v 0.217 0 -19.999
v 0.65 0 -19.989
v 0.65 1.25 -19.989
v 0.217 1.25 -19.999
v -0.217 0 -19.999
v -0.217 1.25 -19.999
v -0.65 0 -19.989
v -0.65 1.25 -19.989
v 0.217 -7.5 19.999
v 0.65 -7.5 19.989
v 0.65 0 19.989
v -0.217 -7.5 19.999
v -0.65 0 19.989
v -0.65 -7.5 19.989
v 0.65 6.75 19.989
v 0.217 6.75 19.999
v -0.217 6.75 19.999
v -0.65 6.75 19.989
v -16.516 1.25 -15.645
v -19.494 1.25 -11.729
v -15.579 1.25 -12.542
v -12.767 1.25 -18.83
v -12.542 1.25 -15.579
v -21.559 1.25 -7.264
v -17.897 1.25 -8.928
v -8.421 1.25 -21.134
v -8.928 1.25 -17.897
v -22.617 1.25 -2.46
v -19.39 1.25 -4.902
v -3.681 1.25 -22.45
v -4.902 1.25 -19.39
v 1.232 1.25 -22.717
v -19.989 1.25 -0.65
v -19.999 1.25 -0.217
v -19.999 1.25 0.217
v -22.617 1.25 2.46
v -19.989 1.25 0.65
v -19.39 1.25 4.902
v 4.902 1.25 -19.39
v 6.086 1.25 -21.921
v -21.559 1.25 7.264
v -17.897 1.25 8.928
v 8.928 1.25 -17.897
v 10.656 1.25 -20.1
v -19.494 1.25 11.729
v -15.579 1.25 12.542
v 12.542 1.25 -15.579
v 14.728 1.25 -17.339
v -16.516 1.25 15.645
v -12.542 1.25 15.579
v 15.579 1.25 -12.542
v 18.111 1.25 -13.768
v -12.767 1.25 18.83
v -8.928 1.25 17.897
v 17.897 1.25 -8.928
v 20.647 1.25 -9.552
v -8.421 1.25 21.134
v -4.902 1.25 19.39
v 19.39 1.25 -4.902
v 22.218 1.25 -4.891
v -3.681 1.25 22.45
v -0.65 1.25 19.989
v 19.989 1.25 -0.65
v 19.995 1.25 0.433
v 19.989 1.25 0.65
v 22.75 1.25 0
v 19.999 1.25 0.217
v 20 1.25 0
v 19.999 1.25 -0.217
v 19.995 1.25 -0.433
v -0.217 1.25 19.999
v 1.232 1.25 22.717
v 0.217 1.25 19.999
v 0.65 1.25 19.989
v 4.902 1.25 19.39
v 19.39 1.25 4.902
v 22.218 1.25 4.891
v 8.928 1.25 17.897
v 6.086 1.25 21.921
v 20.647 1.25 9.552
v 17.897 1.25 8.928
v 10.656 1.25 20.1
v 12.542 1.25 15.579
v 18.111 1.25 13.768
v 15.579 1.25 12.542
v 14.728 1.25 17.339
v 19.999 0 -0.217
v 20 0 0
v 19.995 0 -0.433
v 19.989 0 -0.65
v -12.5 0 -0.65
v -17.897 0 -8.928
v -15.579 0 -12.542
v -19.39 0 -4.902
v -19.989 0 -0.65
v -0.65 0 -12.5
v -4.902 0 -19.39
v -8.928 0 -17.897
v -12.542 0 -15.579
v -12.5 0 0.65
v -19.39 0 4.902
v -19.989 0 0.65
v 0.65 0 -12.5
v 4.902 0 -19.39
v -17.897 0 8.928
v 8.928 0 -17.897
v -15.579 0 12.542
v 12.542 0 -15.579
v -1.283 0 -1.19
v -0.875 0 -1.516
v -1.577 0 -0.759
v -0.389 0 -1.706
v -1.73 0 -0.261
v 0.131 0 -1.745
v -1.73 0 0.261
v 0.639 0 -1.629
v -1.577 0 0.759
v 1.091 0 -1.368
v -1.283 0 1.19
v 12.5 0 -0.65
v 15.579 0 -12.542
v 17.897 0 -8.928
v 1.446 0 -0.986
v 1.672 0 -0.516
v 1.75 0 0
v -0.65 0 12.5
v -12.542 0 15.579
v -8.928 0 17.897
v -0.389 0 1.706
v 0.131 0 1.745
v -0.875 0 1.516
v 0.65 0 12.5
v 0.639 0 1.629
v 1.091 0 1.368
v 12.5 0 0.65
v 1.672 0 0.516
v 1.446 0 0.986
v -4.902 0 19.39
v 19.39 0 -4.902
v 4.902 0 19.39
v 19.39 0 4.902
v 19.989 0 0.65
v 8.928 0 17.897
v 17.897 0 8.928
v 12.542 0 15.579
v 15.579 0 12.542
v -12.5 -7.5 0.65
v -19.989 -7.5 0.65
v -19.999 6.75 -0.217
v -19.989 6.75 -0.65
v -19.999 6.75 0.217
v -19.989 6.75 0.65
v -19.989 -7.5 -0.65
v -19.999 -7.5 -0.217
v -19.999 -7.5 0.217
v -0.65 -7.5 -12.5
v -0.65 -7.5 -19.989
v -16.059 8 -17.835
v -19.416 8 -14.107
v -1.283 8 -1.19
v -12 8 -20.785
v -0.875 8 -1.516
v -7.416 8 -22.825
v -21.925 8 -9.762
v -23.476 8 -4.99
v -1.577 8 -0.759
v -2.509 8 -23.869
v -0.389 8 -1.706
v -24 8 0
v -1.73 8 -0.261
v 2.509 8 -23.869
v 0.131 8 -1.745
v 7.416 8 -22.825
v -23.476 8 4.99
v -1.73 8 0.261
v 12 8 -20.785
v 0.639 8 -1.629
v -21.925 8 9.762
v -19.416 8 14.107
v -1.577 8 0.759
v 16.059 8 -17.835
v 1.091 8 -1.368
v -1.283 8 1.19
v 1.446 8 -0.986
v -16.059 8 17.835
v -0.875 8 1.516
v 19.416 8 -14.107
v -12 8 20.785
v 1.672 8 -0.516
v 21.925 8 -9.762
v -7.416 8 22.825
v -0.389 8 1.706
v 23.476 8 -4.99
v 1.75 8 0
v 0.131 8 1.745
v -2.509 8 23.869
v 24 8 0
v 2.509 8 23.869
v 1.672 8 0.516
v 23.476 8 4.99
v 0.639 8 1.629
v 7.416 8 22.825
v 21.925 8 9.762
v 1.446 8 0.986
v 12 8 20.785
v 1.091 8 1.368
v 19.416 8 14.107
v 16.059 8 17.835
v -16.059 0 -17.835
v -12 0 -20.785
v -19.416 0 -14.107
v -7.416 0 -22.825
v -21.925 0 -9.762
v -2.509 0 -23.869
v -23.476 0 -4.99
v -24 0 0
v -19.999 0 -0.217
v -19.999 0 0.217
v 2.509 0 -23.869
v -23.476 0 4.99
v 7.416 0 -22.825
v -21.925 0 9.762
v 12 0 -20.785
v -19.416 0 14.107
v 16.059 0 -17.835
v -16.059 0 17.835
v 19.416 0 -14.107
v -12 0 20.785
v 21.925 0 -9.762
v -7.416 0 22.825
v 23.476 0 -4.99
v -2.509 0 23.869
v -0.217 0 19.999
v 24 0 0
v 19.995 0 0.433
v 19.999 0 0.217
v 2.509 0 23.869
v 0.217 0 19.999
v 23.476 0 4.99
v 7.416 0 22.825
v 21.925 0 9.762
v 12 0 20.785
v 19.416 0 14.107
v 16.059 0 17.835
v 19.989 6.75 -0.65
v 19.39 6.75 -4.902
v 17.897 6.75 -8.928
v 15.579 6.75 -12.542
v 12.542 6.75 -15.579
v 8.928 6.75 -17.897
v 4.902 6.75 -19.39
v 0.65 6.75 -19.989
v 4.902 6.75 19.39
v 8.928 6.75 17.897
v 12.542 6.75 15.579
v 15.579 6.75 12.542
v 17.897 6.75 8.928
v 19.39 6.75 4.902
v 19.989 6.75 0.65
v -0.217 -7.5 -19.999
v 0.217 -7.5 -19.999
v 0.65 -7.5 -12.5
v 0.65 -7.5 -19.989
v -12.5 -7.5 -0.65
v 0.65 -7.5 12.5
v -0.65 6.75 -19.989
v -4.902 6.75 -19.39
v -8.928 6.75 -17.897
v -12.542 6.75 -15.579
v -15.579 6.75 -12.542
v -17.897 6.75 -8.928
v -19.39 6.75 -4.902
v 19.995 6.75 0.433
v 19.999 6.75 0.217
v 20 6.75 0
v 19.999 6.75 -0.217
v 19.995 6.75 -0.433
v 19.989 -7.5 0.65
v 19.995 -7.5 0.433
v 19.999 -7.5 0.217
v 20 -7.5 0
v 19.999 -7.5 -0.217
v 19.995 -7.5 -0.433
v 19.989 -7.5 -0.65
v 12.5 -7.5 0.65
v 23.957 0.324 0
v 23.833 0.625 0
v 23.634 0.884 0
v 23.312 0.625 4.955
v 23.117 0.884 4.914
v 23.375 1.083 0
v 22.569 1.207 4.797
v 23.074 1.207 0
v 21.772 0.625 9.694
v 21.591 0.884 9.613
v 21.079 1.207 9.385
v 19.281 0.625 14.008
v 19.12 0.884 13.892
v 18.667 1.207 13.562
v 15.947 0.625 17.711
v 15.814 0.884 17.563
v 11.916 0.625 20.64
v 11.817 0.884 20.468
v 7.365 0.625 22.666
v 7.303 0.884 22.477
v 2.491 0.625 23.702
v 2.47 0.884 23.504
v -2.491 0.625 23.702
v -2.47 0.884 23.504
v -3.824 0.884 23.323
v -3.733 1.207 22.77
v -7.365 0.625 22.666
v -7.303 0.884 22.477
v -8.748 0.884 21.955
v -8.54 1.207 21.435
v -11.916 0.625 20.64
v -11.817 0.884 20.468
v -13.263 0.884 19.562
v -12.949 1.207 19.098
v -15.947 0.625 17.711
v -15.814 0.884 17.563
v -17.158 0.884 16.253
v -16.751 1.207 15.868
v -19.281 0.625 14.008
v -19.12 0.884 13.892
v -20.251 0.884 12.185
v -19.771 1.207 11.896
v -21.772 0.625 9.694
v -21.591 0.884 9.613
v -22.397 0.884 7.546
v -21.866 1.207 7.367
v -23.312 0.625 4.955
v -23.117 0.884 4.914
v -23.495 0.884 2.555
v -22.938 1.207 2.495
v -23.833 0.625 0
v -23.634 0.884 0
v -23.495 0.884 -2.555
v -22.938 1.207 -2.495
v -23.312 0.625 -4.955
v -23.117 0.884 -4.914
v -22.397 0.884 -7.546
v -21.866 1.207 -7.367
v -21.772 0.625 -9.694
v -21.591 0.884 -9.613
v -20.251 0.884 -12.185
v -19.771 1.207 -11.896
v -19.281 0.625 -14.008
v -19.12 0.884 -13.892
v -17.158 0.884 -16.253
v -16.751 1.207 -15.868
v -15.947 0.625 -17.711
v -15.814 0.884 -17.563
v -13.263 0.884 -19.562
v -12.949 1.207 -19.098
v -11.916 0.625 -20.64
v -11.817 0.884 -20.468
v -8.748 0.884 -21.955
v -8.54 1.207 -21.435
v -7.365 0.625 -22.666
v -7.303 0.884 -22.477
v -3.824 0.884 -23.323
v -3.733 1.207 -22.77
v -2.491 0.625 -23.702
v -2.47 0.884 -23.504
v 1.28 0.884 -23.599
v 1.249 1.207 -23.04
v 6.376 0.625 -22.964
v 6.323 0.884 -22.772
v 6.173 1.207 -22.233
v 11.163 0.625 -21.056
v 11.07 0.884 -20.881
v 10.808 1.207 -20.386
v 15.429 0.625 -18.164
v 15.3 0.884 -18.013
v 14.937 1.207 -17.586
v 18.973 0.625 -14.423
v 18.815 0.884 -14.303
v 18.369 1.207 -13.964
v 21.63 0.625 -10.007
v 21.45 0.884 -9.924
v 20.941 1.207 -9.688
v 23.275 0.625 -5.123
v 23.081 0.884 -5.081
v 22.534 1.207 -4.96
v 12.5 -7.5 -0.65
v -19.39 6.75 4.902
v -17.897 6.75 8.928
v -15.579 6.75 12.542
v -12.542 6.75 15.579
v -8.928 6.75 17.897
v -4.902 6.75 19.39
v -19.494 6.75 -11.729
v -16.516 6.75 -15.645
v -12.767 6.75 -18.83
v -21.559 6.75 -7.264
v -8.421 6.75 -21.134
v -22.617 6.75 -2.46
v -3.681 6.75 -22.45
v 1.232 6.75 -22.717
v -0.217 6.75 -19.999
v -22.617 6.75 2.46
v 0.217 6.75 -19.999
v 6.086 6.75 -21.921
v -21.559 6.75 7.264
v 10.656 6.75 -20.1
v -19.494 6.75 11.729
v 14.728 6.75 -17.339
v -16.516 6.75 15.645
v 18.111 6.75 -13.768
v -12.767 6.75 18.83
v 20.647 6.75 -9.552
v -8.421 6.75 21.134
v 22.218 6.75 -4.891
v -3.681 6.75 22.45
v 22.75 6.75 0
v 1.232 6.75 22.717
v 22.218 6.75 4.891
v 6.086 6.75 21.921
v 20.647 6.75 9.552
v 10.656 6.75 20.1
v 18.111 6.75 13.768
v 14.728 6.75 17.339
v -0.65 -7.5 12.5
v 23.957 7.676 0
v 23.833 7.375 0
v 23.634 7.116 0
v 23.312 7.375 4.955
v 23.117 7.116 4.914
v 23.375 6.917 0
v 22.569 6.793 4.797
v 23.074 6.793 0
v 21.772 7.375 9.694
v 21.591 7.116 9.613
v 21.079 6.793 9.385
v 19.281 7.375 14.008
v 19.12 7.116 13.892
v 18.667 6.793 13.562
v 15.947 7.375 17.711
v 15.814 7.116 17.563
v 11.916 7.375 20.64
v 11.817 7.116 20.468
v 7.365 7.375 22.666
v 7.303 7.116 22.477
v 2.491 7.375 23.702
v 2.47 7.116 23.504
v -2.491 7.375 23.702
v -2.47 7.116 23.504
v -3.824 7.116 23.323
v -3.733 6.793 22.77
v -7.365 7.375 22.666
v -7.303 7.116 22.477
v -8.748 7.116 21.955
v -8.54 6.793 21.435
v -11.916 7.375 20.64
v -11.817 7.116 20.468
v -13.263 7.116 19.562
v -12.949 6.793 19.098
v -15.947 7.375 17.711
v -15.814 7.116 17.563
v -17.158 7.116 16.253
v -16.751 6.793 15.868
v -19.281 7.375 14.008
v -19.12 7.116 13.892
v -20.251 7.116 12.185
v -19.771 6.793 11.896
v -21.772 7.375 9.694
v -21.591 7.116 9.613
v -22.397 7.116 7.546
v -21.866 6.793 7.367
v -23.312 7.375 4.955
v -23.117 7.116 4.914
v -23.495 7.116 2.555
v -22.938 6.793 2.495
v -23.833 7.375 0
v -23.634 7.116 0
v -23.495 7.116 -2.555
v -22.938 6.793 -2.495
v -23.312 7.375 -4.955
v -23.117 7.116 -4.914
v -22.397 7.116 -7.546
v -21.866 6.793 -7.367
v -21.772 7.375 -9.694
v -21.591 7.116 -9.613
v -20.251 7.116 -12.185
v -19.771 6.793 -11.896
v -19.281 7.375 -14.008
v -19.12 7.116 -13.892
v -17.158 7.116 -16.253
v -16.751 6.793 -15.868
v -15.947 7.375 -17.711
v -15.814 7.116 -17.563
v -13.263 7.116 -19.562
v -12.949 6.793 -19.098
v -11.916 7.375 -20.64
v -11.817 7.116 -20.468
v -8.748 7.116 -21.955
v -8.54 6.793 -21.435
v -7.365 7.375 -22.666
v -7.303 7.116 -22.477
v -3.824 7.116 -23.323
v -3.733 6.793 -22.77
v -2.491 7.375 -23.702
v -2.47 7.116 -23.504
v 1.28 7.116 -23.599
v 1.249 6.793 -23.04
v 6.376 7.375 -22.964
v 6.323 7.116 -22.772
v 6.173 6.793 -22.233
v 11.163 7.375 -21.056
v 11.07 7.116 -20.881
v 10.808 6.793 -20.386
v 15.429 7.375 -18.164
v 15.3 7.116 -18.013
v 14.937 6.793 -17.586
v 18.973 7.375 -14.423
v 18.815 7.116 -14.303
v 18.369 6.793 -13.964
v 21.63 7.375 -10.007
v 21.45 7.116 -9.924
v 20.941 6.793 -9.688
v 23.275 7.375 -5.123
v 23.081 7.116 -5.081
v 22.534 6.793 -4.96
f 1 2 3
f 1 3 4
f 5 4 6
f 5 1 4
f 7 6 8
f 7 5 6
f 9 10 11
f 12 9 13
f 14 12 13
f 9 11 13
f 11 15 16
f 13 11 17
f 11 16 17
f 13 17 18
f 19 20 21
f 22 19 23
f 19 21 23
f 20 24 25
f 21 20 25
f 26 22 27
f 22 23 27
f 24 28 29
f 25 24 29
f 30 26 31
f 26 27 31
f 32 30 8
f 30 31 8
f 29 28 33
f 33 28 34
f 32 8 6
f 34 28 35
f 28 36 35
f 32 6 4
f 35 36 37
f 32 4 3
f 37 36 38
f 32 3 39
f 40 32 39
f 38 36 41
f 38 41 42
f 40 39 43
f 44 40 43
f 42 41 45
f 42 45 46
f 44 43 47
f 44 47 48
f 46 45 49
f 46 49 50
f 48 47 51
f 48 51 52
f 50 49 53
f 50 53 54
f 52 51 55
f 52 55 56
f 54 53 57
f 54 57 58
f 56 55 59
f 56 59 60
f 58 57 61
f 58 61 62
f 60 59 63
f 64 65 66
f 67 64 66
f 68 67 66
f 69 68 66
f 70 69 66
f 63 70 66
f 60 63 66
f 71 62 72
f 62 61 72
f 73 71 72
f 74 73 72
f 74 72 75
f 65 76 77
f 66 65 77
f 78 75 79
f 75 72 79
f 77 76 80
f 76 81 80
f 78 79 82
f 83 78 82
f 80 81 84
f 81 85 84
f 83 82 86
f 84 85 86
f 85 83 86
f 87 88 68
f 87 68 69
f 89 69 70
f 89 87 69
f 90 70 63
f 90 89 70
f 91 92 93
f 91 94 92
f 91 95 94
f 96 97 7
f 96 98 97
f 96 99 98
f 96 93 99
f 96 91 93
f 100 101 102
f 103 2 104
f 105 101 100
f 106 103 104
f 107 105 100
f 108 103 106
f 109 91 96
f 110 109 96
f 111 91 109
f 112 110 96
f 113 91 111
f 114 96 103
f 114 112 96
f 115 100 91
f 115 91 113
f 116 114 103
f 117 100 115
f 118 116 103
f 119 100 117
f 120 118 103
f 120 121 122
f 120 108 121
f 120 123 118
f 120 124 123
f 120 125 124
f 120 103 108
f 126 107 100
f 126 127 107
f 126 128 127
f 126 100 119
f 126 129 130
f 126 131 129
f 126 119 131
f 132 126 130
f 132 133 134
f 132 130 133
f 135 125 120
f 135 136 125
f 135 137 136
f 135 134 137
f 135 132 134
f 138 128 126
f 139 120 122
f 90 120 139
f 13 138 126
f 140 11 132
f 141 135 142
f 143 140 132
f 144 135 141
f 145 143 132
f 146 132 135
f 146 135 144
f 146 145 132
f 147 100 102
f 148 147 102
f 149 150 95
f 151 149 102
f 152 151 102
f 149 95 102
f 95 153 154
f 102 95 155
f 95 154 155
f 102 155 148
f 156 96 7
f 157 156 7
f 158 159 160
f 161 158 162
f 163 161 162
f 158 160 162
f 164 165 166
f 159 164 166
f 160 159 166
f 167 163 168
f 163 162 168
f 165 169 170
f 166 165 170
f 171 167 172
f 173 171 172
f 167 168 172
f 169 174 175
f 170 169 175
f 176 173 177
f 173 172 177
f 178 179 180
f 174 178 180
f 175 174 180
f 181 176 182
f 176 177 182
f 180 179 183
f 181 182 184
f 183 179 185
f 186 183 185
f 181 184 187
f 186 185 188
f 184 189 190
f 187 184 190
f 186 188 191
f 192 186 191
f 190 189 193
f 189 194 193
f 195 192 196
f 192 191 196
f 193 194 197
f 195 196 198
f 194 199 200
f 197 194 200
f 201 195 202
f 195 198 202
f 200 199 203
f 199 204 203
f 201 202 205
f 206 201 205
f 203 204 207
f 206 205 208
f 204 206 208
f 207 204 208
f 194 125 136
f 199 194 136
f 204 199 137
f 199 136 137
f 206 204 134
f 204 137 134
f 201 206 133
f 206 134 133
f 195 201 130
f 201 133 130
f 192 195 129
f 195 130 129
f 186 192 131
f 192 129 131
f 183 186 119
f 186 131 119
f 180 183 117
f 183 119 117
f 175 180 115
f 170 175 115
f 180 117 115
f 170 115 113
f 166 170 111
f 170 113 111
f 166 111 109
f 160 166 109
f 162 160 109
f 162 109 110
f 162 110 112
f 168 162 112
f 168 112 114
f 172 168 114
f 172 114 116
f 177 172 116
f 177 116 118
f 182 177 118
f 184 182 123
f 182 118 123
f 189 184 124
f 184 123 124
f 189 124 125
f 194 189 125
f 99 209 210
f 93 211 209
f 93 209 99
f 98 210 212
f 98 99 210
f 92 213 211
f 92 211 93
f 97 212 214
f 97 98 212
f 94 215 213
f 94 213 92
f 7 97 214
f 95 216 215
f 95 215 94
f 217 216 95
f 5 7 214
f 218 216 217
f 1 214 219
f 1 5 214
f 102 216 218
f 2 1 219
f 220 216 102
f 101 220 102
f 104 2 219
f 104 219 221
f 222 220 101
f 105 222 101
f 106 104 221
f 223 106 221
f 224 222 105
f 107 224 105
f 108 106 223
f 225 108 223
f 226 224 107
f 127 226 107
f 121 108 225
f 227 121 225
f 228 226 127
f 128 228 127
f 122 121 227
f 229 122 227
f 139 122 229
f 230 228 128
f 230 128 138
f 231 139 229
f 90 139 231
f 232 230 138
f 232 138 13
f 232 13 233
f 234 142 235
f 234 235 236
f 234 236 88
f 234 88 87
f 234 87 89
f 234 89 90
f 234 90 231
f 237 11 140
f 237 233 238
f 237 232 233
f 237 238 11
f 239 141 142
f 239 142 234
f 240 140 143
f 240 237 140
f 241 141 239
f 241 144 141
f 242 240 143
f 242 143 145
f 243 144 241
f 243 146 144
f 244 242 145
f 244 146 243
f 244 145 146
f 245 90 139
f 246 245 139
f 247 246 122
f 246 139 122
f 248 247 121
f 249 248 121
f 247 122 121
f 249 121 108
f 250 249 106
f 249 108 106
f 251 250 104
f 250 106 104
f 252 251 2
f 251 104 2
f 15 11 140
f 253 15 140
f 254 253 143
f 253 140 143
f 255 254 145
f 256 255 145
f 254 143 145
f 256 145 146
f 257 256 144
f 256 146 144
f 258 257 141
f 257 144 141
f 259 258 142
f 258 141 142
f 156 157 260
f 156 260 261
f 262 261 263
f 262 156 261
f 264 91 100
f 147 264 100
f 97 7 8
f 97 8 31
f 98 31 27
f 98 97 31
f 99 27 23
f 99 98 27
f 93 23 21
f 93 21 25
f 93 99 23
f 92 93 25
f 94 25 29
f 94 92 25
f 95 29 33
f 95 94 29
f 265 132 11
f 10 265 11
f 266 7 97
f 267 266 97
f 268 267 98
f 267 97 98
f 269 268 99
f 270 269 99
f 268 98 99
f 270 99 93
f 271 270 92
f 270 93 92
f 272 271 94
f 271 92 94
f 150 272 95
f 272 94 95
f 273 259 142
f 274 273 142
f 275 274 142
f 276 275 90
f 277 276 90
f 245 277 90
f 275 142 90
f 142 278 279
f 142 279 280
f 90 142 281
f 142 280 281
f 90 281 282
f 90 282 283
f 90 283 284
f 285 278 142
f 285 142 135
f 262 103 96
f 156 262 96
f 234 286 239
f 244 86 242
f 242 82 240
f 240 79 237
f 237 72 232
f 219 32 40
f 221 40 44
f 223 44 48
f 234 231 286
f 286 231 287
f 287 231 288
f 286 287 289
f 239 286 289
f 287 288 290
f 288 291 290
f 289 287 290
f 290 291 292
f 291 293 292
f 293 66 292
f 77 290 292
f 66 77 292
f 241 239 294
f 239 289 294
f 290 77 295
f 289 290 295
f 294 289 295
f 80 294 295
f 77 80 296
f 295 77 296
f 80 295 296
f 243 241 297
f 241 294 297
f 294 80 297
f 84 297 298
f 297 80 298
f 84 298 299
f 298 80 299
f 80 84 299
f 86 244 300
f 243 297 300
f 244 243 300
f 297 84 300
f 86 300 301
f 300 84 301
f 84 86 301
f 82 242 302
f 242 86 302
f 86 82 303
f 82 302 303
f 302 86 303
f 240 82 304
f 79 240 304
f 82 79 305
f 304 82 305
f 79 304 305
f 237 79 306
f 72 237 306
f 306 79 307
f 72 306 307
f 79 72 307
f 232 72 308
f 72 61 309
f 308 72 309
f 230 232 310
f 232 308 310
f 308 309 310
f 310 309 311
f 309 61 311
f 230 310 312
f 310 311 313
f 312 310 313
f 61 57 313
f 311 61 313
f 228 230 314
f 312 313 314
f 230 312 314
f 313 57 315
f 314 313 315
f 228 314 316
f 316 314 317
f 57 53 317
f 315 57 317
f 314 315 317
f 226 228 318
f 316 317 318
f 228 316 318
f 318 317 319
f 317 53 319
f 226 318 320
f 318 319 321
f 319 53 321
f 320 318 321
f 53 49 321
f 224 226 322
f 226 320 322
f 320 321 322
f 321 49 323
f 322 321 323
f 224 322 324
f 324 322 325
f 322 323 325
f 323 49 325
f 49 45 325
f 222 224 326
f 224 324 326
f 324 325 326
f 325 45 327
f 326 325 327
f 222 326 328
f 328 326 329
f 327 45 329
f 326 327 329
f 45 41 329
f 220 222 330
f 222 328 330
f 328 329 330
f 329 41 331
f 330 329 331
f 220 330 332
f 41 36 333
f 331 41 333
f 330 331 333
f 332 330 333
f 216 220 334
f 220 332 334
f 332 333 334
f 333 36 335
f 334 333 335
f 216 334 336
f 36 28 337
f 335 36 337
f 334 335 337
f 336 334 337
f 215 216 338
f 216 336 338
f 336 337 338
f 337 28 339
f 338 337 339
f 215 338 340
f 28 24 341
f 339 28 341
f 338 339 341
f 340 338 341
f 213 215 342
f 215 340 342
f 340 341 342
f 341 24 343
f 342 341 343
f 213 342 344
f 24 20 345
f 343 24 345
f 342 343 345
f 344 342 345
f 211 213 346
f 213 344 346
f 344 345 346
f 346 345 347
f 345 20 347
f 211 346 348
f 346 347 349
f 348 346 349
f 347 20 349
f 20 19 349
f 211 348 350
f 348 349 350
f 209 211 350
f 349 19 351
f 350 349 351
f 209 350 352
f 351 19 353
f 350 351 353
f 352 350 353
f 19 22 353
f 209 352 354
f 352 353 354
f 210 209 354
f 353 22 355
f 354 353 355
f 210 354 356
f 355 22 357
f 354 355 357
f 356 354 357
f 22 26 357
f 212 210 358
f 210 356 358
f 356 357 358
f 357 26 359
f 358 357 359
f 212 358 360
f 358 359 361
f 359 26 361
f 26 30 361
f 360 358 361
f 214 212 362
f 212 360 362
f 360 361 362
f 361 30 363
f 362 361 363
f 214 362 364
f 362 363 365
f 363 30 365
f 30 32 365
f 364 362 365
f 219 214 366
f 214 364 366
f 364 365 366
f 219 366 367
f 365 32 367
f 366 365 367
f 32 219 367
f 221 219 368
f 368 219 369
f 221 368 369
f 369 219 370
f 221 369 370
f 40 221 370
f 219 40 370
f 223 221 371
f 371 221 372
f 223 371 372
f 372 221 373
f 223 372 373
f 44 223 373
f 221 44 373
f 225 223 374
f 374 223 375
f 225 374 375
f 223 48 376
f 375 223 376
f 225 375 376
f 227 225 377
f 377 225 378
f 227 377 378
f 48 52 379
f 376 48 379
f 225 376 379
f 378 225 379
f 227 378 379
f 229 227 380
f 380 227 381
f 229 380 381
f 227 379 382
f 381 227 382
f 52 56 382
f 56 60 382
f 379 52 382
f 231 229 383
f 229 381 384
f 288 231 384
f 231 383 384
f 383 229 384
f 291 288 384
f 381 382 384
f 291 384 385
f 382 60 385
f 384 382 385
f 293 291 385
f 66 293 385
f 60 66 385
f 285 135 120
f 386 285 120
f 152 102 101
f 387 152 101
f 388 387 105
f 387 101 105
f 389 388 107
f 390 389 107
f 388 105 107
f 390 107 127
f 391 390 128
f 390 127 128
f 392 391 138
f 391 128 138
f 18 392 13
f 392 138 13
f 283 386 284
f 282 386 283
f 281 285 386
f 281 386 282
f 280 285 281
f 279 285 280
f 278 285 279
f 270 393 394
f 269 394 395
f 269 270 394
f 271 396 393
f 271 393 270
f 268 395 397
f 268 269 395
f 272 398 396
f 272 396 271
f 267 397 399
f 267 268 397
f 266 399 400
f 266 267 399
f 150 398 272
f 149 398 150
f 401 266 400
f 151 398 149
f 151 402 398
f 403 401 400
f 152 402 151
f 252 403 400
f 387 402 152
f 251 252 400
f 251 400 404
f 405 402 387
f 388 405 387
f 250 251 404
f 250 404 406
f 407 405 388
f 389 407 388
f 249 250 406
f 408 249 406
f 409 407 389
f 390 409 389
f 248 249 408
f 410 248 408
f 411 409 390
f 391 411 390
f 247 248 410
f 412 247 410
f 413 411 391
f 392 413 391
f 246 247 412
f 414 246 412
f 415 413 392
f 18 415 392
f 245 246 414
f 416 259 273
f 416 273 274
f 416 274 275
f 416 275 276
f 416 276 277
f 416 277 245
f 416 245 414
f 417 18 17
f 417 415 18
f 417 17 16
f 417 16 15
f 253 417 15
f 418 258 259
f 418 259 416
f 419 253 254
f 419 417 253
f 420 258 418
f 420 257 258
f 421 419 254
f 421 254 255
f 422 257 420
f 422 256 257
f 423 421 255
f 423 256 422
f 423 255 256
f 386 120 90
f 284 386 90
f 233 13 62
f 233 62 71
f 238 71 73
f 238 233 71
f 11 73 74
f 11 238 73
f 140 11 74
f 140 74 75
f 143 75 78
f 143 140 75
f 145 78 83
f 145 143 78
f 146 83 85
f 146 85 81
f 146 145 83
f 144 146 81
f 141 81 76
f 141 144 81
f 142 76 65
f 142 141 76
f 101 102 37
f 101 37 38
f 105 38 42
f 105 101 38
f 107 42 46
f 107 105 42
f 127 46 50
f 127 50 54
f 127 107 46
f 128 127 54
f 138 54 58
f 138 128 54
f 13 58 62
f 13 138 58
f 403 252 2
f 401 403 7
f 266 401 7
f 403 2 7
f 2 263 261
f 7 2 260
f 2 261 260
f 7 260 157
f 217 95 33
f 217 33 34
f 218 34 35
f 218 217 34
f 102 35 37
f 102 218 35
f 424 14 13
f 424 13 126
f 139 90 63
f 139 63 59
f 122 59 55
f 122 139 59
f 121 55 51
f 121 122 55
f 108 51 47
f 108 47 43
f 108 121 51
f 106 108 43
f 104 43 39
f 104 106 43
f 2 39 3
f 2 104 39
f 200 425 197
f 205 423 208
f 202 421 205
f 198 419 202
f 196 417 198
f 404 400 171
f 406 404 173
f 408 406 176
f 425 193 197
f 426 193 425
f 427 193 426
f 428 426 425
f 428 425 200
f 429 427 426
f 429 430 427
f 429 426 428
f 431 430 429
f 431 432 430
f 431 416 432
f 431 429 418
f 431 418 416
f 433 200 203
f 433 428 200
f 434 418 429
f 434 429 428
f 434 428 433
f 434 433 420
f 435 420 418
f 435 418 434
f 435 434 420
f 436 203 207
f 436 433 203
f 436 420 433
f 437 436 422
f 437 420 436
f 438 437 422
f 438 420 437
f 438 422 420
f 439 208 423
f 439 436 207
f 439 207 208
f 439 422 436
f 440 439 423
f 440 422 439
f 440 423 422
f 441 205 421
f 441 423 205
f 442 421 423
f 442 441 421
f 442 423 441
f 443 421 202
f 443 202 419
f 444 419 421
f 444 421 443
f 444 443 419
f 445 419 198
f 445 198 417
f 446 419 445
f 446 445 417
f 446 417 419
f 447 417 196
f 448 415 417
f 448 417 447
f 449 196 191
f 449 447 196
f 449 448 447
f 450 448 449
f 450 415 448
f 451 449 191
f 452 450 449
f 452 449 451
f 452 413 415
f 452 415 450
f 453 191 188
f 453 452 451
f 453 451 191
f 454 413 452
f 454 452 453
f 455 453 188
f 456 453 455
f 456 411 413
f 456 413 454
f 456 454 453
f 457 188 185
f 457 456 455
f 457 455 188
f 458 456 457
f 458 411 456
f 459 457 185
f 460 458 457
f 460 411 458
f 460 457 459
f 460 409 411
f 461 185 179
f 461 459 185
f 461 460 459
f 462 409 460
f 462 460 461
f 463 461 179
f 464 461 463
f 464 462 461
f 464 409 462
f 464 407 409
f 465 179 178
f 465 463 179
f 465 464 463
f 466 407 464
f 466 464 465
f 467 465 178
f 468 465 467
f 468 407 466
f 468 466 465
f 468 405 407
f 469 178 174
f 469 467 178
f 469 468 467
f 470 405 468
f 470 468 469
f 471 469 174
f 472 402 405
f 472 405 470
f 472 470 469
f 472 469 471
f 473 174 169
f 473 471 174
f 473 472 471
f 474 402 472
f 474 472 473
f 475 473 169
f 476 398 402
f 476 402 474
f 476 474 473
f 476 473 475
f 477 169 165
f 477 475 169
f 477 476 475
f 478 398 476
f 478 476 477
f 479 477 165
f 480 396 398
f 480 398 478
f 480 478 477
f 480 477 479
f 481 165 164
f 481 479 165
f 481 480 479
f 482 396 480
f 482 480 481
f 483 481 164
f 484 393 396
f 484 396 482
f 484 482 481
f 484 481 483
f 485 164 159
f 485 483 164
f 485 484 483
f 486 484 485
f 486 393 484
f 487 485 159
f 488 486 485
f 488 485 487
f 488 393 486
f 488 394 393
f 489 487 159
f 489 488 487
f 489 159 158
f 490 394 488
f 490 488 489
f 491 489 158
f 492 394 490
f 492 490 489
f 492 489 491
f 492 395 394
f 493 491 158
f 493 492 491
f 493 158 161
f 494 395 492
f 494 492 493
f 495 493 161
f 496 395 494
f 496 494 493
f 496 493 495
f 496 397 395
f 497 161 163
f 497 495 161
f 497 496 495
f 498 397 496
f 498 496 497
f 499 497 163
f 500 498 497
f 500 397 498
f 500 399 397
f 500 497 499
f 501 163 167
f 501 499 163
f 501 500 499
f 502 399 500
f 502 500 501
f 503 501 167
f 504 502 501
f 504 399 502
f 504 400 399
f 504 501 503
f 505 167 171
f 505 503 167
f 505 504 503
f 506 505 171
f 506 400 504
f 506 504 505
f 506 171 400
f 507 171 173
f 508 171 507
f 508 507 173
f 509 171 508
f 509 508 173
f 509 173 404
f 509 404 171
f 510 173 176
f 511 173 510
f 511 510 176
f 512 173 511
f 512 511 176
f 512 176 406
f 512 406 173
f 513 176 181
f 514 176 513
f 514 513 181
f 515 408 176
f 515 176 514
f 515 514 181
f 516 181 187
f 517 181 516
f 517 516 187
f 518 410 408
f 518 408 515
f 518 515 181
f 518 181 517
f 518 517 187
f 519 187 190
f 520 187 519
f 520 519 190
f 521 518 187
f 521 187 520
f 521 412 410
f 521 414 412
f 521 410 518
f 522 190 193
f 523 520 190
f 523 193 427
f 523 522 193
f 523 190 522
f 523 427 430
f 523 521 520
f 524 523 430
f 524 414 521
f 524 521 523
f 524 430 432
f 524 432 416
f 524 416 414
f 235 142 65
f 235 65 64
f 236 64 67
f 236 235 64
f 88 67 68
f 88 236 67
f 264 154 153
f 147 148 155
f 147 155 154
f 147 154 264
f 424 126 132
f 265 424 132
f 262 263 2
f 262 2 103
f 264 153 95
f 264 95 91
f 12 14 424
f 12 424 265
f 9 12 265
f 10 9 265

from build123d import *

# Parameters (mm, degrees)
F0_R     = 24
F0_R_2   = 1.75
F1_DEPTH = 8
F2_DEPTH = 6.75
F3_DEPTH = 1.25
F4_R     = 1.24999
F4_2_R   = 1.24999
F5_DEPTH = 7.5


# Not quite as in the source:
# - a fillet or chamfer is up to 0.001 mm smaller than in the source, because OpenCascade refuses the exact size
# - after a boolean that leaves OpenCascade's solid faulty, fix() repairs it


with BuildPart() as f1:
    # F0 (on Front) → F1 (new body)
    with BuildSketch(Plane.XZ):
        Circle(F0_R)
        with BuildLine():
            ThreePointArc((19.9894375, 0.649914174), (19.9973592007, 0.325), (20, 0))
            ThreePointArc((20, 0), (19.9973592007, -0.325), (19.9894375, -0.649914174))
            ThreePointArc((19.9894375, -0.649914174), (14.1421356237, -14.1421356237), (0.649914174, -19.9894375))
            ThreePointArc((0.649914174, -19.9894375), (0, -20), (-0.649914174, -19.9894375))
            ThreePointArc((-0.649914174, -19.9894375), (-14.1421356237, -14.1421356237), (-19.9894375, -0.649914174))
            ThreePointArc((-19.9894375, -0.649914174), (-20, 0), (-19.9894375, 0.649914174))
            ThreePointArc((-19.9894375, 0.649914174), (-14.1421356237, 14.1421356237), (-0.649914174, 19.9894375))
            ThreePointArc((-0.649914174, 19.9894375), (0, 20), (0.649914174, 19.9894375))
            ThreePointArc((0.649914174, 19.9894375), (14.1421356237, 14.1421356237), (19.9894375, 0.649914174))
        make_face(mode=Mode.SUBTRACT)
        with BuildLine():
            Line((12.5, 0.649914174), (19.9894375, 0.649914174))
            ThreePointArc((19.9894375, 0.649914174), (14.1421356237, 14.1421356237), (0.649914174, 19.9894375))
            Line((0.649914174, 19.9894375), (0.649914174, 12.5))
            Line((0.649914174, 12.5), (-0.649914174, 12.5))
            Line((-0.649914174, 12.5), (-0.649914174, 19.9894375))
            ThreePointArc((-0.649914174, 19.9894375), (-14.1421356237, 14.1421356237), (-19.9894375, 0.649914174))
            Line((-19.9894375, 0.649914174), (-12.5, 0.649914174))
            Line((-12.5, 0.649914174), (-12.5, -0.649914174))
            Line((-12.5, -0.649914174), (-19.9894375, -0.649914174))
            ThreePointArc((-19.9894375, -0.649914174), (-14.1421356237, -14.1421356237), (-0.649914174, -19.9894375))
            Line((-0.649914174, -19.9894375), (-0.649914174, -12.5))
            Line((-0.649914174, -12.5), (0.649914174, -12.5))
            Line((0.649914174, -12.5), (0.649914174, -19.9894375))
            ThreePointArc((0.649914174, -19.9894375), (14.1421356237, -14.1421356237), (19.9894375, -0.649914174))
            Line((19.9894375, -0.649914174), (12.5, -0.649914174))
            Line((12.5, -0.649914174), (12.5, 0.649914174))
        make_face()
        Circle(F0_R_2, mode=Mode.SUBTRACT)
        with BuildLine():
            Line((0.649914174, 12.5), (0.649914174, 19.9894375))
            ThreePointArc((0.649914174, 19.9894375), (0, 20), (-0.649914174, 19.9894375))
            Line((-0.649914174, 19.9894375), (-0.649914174, 12.5))
            Line((-0.649914174, 12.5), (0.649914174, 12.5))
        make_face()
        with BuildLine():
            ThreePointArc((19.9894375, -0.649914174), (19.9973592007, -0.325), (20, 0))
            ThreePointArc((20, 0), (19.9973592007, 0.325), (19.9894375, 0.649914174))
            Line((19.9894375, 0.649914174), (12.5, 0.649914174))
            Line((12.5, 0.649914174), (12.5, -0.649914174))
            Line((12.5, -0.649914174), (19.9894375, -0.649914174))
        make_face()
        with BuildLine():
            Line((-12.5, 0.649914174), (-19.9894375, 0.649914174))
            ThreePointArc((-19.9894375, 0.649914174), (-20, 0), (-19.9894375, -0.649914174))
            Line((-19.9894375, -0.649914174), (-12.5, -0.649914174))
            Line((-12.5, -0.649914174), (-12.5, 0.649914174))
        make_face()
        with BuildLine():
            ThreePointArc((-0.649914174, -19.9894375), (0, -20), (0.649914174, -19.9894375))
            Line((0.649914174, -19.9894375), (0.649914174, -12.5))
            Line((0.649914174, -12.5), (-0.649914174, -12.5))
            Line((-0.649914174, -12.5), (-0.649914174, -19.9894375))
        make_face()
    extrude(amount=-F1_DEPTH)

    # F0 (on Front) → F2 (cut)
    with BuildSketch(Plane.XZ):
        Circle(F0_R)
        with BuildLine():
            ThreePointArc((19.9894375, 0.649914174), (19.9973592007, 0.325), (20, 0))
            ThreePointArc((20, 0), (19.9973592007, -0.325), (19.9894375, -0.649914174))
            ThreePointArc((19.9894375, -0.649914174), (14.1421356237, -14.1421356237), (0.649914174, -19.9894375))
            ThreePointArc((0.649914174, -19.9894375), (0, -20), (-0.649914174, -19.9894375))
            ThreePointArc((-0.649914174, -19.9894375), (-14.1421356237, -14.1421356237), (-19.9894375, -0.649914174))
            ThreePointArc((-19.9894375, -0.649914174), (-20, 0), (-19.9894375, 0.649914174))
            ThreePointArc((-19.9894375, 0.649914174), (-14.1421356237, 14.1421356237), (-0.649914174, 19.9894375))
            ThreePointArc((-0.649914174, 19.9894375), (0, 20), (0.649914174, 19.9894375))
            ThreePointArc((0.649914174, 19.9894375), (14.1421356237, 14.1421356237), (19.9894375, 0.649914174))
        make_face(mode=Mode.SUBTRACT)
    extrude(amount=-F2_DEPTH, mode=Mode.SUBTRACT)

    # F4 (radius 1.25 in the source; OpenCascade refuses exactly that, so slightly less here)
    f4_edges = [f1.edges().sort_by_distance(p)[0] for p in [
        (-24, 6.75, 0),
    ]]
    fillet(f4_edges, radius=F4_R)

    # F0 (on Front) → F5 (join)
    with BuildSketch(Plane.XZ):
        with BuildLine():
            Line((0.649914174, 12.5), (0.649914174, 19.9894375))
            ThreePointArc((0.649914174, 19.9894375), (0, 20), (-0.649914174, 19.9894375))
            Line((-0.649914174, 19.9894375), (-0.649914174, 12.5))
            Line((-0.649914174, 12.5), (0.649914174, 12.5))
        make_face()
        with BuildLine():
            Line((-12.5, 0.649914174), (-19.9894375, 0.649914174))
            ThreePointArc((-19.9894375, 0.649914174), (-20, 0), (-19.9894375, -0.649914174))
            Line((-19.9894375, -0.649914174), (-12.5, -0.649914174))
            Line((-12.5, -0.649914174), (-12.5, 0.649914174))
        make_face()
        with BuildLine():
            ThreePointArc((19.9894375, -0.649914174), (19.9973592007, -0.325), (20, 0))
            ThreePointArc((20, 0), (19.9973592007, 0.325), (19.9894375, 0.649914174))
            Line((19.9894375, 0.649914174), (12.5, 0.649914174))
            Line((12.5, 0.649914174), (12.5, -0.649914174))
            Line((12.5, -0.649914174), (19.9894375, -0.649914174))
        make_face()
        with BuildLine():
            ThreePointArc((-0.649914174, -19.9894375), (0, -20), (0.649914174, -19.9894375))
            Line((0.649914174, -19.9894375), (0.649914174, -12.5))
            Line((0.649914174, -12.5), (-0.649914174, -12.5))
            Line((-0.649914174, -12.5), (-0.649914174, -19.9894375))
        make_face()
    extrude(amount=F5_DEPTH)

    add(f1.part.fix(), mode=Mode.REPLACE)


with BuildPart() as f3:
    # F0 (on Front) → F3 (new body)
    with BuildSketch(Plane.XZ):
        Circle(F0_R)
        with BuildLine():
            ThreePointArc((19.9894375, 0.649914174), (19.9973592007, 0.325), (20, 0))
            ThreePointArc((20, 0), (19.9973592007, -0.325), (19.9894375, -0.649914174))
            ThreePointArc((19.9894375, -0.649914174), (14.1421356237, -14.1421356237), (0.649914174, -19.9894375))
            ThreePointArc((0.649914174, -19.9894375), (0, -20), (-0.649914174, -19.9894375))
            ThreePointArc((-0.649914174, -19.9894375), (-14.1421356237, -14.1421356237), (-19.9894375, -0.649914174))
            ThreePointArc((-19.9894375, -0.649914174), (-20, 0), (-19.9894375, 0.649914174))
            ThreePointArc((-19.9894375, 0.649914174), (-14.1421356237, 14.1421356237), (-0.649914174, 19.9894375))
            ThreePointArc((-0.649914174, 19.9894375), (0, 20), (0.649914174, 19.9894375))
            ThreePointArc((0.649914174, 19.9894375), (14.1421356237, 14.1421356237), (19.9894375, 0.649914174))
        make_face(mode=Mode.SUBTRACT)
    extrude(amount=-F3_DEPTH)

    # F4#2 (radius 1.25 in the source; OpenCascade refuses exactly that, so slightly less here)
    f4_2_edges = [f3.edges().sort_by_distance(p)[0] for p in [
        (-24, 1.25, 0),
    ]]
    fillet(f4_2_edges, radius=F4_2_R)


solid = Compound([f1.part, f3.part])
